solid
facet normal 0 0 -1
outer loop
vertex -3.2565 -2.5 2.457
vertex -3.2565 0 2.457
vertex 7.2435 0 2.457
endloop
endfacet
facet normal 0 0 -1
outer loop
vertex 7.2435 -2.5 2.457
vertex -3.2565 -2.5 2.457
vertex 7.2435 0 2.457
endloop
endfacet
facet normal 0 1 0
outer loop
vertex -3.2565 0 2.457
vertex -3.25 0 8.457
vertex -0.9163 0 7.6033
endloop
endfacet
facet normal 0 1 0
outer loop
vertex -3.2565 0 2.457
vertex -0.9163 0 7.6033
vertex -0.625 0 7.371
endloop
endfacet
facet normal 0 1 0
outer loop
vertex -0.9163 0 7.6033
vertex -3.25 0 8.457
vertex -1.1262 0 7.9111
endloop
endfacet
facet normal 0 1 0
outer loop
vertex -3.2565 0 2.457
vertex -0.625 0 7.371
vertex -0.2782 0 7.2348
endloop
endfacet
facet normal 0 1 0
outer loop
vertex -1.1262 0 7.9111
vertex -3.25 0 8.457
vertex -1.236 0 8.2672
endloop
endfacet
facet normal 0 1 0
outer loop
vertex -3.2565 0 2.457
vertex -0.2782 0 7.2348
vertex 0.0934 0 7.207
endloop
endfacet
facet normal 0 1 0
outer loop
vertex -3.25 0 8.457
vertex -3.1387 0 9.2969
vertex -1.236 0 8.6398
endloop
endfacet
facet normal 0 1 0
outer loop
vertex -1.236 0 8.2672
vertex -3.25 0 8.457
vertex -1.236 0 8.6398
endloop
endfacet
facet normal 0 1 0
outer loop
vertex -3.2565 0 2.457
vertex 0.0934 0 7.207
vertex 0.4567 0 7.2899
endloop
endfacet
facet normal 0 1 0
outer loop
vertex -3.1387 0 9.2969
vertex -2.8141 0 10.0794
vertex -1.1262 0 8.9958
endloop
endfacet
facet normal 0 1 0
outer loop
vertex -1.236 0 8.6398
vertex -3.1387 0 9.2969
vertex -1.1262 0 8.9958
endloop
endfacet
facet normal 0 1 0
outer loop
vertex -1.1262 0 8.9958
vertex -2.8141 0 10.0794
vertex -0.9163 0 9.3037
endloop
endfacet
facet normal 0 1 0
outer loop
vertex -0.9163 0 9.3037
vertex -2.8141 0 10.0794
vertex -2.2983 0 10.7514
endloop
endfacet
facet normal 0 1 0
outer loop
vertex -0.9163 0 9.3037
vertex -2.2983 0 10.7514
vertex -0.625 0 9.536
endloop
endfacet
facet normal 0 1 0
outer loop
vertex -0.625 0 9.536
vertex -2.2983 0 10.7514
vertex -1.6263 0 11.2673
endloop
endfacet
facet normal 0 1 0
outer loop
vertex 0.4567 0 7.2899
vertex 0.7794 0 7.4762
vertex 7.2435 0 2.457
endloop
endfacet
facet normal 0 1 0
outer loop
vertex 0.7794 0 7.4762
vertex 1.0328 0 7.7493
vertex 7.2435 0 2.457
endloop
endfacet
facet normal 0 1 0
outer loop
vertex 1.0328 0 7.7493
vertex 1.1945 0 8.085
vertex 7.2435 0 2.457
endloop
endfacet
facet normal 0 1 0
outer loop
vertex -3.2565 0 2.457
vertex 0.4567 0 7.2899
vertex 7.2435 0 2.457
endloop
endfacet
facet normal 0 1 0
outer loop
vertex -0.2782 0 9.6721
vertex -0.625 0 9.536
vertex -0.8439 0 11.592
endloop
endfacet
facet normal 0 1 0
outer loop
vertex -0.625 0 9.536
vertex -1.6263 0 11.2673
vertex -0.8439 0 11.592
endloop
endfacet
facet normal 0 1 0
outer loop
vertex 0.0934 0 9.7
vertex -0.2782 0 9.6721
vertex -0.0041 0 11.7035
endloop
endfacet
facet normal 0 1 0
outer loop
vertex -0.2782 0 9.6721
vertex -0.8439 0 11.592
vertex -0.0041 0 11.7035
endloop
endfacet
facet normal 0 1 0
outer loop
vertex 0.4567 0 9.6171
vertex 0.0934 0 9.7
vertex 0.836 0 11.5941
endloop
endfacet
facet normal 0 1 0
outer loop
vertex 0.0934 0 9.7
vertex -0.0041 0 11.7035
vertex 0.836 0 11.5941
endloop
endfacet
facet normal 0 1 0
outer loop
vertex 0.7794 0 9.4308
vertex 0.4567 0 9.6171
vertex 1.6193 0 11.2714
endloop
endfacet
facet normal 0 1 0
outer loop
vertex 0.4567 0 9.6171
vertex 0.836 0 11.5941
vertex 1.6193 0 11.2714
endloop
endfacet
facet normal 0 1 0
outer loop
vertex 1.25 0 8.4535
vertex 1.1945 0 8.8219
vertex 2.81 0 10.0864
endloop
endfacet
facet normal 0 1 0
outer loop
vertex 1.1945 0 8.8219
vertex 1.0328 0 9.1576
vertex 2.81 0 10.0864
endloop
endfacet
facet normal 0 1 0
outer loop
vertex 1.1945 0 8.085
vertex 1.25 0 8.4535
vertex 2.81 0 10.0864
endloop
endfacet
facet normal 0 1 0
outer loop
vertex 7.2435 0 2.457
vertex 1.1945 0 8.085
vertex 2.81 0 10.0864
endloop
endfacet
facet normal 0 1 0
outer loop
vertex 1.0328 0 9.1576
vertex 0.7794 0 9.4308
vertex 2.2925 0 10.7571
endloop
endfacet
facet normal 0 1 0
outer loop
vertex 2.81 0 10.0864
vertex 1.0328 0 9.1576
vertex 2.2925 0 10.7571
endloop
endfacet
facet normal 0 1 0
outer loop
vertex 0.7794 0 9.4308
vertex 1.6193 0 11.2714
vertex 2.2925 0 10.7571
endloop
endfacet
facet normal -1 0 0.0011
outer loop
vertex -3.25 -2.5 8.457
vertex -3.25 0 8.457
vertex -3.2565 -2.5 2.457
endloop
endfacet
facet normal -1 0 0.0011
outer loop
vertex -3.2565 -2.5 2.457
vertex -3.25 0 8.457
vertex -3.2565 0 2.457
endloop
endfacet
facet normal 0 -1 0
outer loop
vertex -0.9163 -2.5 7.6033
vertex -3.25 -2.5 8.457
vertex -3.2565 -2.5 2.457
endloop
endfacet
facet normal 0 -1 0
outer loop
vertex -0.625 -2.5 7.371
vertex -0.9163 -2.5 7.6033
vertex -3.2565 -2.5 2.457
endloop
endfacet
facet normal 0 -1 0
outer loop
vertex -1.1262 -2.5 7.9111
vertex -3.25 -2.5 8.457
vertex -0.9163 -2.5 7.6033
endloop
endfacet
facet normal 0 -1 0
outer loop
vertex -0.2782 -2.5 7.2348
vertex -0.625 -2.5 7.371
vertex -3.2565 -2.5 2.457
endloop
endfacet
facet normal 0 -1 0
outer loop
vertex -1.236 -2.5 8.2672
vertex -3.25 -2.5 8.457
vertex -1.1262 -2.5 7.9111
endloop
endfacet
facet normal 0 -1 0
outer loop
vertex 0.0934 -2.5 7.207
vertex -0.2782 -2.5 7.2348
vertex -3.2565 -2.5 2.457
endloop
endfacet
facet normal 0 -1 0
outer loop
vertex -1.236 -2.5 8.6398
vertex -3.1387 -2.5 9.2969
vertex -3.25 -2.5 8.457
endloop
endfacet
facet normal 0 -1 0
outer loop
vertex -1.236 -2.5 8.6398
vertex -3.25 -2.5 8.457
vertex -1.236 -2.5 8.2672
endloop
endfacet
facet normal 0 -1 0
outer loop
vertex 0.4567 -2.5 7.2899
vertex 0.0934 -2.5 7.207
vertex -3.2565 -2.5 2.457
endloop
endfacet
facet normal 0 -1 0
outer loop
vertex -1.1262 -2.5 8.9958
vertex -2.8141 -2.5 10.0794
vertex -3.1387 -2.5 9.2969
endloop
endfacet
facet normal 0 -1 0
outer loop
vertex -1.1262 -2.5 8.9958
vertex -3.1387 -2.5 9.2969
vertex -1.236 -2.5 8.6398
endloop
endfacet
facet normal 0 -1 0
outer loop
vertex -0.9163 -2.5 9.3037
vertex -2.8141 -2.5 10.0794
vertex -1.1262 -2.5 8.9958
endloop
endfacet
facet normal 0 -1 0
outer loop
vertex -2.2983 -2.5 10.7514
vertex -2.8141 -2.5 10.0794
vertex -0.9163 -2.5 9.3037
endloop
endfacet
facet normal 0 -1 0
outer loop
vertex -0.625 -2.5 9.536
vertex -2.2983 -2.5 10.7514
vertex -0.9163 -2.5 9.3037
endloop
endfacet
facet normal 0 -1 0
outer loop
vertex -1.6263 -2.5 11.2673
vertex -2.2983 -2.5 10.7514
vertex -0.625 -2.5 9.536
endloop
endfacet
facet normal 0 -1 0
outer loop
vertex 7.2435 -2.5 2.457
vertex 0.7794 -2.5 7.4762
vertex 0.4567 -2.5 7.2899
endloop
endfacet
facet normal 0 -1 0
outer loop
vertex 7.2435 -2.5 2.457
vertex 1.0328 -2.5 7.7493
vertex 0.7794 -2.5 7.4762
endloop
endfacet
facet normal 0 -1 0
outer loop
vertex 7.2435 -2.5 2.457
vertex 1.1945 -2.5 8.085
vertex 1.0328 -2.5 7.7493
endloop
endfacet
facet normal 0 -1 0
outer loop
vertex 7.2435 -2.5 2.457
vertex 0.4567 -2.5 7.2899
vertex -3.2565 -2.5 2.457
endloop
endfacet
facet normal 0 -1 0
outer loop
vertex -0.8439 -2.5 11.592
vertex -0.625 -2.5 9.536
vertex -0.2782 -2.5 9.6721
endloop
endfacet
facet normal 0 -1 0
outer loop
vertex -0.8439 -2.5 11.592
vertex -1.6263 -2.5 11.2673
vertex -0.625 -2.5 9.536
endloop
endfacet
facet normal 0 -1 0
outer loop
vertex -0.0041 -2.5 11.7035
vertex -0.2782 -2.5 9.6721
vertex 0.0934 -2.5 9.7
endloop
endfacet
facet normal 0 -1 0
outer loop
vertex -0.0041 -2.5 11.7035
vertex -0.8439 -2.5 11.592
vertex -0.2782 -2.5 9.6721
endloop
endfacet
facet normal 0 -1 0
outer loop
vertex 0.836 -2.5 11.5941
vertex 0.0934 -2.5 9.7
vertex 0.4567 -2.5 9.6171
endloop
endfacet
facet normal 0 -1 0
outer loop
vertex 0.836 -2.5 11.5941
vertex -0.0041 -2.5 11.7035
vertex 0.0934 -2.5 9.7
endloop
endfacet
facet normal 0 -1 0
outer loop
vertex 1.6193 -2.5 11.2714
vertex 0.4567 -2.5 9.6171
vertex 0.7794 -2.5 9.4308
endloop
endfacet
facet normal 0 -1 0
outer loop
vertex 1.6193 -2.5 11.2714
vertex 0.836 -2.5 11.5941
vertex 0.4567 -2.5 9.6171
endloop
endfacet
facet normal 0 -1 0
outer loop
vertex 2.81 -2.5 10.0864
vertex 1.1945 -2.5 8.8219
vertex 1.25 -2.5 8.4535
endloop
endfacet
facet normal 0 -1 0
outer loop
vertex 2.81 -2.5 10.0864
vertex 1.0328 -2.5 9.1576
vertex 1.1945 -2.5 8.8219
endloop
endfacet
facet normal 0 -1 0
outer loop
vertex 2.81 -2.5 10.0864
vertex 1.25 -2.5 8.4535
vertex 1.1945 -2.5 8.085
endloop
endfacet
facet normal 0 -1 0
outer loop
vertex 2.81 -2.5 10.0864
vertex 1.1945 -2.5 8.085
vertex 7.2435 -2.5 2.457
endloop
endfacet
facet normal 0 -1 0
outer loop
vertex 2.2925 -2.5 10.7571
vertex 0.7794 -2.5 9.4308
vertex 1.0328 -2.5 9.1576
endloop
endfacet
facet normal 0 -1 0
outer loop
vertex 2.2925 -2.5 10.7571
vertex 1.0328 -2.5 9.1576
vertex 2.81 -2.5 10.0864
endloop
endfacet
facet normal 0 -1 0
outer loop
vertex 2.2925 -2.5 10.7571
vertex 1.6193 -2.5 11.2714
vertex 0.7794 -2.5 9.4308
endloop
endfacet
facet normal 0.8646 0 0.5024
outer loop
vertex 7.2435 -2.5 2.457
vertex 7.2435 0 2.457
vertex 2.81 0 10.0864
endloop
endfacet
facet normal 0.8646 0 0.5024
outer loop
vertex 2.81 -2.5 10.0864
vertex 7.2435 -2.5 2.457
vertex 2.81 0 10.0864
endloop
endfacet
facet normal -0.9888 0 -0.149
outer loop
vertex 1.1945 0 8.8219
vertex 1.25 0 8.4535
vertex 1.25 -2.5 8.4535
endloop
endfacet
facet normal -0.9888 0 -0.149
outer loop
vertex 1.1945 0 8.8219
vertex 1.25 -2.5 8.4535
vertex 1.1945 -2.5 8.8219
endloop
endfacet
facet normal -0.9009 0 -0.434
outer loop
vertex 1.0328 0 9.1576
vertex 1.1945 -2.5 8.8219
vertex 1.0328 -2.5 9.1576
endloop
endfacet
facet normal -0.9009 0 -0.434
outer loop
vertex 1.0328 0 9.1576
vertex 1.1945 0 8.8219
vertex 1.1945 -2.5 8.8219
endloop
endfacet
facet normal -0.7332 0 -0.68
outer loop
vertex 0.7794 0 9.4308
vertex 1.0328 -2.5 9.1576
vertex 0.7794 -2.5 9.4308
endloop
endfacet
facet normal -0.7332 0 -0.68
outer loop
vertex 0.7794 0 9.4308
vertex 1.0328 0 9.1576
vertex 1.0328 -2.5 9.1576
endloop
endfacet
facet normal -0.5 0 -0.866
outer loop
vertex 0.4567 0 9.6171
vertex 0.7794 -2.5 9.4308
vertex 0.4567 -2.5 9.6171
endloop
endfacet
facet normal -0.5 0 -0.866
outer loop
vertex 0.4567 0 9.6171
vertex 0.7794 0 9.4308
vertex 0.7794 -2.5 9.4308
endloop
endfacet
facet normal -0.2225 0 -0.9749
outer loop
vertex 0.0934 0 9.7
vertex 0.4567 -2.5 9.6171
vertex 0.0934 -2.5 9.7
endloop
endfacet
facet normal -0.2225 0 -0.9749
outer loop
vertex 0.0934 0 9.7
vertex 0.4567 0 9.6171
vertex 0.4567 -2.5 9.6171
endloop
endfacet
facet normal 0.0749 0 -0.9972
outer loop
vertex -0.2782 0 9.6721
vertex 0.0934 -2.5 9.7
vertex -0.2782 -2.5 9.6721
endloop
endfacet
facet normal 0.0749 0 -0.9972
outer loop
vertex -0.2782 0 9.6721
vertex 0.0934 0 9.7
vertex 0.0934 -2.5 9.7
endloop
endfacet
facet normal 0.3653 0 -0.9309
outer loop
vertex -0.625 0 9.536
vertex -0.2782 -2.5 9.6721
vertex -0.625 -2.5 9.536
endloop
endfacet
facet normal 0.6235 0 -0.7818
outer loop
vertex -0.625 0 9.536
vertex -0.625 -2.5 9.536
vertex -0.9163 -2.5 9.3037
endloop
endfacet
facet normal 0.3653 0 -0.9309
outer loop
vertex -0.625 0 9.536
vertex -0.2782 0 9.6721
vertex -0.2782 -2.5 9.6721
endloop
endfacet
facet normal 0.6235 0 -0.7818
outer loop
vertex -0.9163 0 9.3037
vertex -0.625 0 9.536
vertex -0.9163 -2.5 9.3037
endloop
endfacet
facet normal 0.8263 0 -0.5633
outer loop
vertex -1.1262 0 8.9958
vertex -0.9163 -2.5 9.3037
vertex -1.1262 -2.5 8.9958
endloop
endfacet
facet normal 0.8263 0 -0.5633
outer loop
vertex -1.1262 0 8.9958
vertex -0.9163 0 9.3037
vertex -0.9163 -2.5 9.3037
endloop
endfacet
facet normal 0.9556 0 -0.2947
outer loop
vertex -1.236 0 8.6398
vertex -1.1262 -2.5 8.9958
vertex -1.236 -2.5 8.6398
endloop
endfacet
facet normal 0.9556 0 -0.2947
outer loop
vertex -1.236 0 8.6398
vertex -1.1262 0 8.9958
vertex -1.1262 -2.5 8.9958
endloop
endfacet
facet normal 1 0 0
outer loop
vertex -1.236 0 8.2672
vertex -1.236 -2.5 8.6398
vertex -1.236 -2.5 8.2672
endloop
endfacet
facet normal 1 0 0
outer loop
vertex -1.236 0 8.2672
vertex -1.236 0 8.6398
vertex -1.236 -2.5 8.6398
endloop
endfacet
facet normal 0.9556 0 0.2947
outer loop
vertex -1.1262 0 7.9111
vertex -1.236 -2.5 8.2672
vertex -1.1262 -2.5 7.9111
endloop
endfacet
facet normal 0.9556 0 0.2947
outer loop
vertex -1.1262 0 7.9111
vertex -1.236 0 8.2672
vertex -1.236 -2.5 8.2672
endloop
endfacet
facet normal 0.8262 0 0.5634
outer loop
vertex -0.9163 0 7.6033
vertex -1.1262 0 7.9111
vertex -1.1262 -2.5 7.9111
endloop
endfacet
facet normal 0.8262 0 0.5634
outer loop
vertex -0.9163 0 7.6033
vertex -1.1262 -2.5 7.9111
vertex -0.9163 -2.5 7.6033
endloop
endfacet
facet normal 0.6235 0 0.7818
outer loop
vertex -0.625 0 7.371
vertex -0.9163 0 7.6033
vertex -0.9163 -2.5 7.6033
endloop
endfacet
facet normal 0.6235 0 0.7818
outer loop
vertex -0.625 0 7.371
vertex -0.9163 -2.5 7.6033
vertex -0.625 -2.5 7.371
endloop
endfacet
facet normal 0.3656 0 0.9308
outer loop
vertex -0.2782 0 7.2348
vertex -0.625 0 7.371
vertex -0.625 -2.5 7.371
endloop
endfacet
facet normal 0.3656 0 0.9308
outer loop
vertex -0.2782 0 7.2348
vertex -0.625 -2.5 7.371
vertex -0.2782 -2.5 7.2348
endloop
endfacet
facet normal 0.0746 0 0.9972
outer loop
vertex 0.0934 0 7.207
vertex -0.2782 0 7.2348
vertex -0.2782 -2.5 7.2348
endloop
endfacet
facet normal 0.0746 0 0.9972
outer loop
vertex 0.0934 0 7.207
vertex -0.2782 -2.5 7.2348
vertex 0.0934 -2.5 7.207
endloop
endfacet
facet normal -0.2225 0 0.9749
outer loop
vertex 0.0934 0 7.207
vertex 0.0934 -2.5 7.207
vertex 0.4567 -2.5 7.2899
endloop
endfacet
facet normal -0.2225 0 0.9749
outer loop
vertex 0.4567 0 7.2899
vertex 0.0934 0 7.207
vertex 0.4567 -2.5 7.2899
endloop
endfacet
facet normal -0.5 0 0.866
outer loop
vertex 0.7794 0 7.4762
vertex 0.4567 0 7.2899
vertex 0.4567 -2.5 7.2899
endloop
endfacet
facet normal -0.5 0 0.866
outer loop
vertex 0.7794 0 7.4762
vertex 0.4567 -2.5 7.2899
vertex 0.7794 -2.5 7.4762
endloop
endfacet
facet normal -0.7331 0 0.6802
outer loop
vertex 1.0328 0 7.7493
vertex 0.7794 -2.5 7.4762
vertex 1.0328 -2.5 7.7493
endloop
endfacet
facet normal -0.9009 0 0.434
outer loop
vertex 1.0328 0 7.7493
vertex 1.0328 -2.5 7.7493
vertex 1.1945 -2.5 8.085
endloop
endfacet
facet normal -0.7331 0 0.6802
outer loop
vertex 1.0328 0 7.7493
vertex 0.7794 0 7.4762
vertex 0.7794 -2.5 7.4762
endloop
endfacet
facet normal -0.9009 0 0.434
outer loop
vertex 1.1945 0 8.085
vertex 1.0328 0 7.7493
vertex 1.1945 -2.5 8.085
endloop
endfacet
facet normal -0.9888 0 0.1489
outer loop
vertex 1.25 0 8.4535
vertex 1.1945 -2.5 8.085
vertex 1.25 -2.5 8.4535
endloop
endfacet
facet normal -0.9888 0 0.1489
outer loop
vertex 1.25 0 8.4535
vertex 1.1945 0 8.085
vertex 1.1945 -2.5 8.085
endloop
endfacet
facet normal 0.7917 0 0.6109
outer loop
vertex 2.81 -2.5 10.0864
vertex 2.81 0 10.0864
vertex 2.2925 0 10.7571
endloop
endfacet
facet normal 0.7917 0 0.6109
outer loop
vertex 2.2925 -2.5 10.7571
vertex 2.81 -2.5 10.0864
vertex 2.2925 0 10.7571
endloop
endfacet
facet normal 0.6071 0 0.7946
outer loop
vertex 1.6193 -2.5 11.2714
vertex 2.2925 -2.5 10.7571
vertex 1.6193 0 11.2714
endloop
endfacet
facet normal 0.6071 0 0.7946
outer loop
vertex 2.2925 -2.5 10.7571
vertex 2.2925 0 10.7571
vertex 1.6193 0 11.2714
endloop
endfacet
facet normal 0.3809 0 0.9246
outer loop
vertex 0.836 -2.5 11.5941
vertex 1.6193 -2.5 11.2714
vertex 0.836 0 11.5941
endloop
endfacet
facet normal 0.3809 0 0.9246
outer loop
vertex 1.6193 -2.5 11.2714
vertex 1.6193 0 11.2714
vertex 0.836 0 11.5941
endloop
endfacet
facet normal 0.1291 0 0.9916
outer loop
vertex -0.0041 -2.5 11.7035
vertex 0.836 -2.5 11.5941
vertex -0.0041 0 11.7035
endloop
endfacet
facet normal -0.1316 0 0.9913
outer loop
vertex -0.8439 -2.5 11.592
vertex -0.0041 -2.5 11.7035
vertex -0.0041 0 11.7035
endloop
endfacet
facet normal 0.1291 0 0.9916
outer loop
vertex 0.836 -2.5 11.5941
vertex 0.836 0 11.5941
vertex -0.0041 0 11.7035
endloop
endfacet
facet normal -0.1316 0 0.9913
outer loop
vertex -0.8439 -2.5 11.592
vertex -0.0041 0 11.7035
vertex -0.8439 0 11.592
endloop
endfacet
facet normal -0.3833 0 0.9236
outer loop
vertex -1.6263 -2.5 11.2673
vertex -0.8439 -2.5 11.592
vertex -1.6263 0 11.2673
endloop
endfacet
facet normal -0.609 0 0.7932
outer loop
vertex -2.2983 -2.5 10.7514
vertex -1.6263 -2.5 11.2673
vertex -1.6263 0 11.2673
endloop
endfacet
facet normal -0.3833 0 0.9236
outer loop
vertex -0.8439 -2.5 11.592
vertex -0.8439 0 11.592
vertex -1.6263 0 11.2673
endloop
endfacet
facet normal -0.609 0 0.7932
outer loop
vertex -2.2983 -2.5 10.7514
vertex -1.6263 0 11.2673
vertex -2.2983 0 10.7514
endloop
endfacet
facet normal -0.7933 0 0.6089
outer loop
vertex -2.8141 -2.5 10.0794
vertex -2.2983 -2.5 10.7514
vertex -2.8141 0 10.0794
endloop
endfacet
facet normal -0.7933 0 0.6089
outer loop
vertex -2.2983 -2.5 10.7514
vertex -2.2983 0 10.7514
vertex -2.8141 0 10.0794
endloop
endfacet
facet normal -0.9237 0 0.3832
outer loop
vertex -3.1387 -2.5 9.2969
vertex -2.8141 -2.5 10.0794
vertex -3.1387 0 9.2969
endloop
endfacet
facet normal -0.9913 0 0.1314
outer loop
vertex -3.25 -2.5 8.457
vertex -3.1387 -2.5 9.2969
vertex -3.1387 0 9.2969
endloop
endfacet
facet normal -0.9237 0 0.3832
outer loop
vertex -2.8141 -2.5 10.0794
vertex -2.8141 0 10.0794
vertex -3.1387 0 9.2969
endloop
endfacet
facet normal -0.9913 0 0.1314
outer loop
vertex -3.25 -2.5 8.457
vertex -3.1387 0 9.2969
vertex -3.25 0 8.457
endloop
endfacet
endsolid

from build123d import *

# Parameters (mm, degrees)
F0_R     = 1.25
F1_DEPTH = 2.5


with BuildPart() as f1:
    # F0 (on Front) → F1 (new body)
    with BuildSketch(Plane.XZ):
        with BuildLine():
            ThreePointArc((-3.249998, 8.457035), (-0.001773, 5.203488), (3.25, 8.453488))
            ThreePointArc((3.25, 8.453488), (3.138074, 9.299061), (2.810004, 10.086393))
            ThreePointArc((2.810004, 10.086393), (-0.843861, 11.592022), (-3.249998, 8.457035))
        make_face()
        with Locations((0, 8.453488)):
            Circle(F0_R, mode=Mode.SUBTRACT)
        with BuildLine():
            ThreePointArc((2.810004, 10.086393), (3.138074, 9.299061), (3.25, 8.453488))
            ThreePointArc((3.25, 8.453488), (-0.001773, 5.203488), (-3.249998, 8.457035))
            Line((-3.249998, 8.457035), (-3.256546, 2.457038))
            Line((-3.256546, 2.457038), (7.243454, 2.457038))
            Line((7.243454, 2.457038), (2.810004, 10.086393))
        make_face()
    extrude(amount=F1_DEPTH)


solid = f1.part
